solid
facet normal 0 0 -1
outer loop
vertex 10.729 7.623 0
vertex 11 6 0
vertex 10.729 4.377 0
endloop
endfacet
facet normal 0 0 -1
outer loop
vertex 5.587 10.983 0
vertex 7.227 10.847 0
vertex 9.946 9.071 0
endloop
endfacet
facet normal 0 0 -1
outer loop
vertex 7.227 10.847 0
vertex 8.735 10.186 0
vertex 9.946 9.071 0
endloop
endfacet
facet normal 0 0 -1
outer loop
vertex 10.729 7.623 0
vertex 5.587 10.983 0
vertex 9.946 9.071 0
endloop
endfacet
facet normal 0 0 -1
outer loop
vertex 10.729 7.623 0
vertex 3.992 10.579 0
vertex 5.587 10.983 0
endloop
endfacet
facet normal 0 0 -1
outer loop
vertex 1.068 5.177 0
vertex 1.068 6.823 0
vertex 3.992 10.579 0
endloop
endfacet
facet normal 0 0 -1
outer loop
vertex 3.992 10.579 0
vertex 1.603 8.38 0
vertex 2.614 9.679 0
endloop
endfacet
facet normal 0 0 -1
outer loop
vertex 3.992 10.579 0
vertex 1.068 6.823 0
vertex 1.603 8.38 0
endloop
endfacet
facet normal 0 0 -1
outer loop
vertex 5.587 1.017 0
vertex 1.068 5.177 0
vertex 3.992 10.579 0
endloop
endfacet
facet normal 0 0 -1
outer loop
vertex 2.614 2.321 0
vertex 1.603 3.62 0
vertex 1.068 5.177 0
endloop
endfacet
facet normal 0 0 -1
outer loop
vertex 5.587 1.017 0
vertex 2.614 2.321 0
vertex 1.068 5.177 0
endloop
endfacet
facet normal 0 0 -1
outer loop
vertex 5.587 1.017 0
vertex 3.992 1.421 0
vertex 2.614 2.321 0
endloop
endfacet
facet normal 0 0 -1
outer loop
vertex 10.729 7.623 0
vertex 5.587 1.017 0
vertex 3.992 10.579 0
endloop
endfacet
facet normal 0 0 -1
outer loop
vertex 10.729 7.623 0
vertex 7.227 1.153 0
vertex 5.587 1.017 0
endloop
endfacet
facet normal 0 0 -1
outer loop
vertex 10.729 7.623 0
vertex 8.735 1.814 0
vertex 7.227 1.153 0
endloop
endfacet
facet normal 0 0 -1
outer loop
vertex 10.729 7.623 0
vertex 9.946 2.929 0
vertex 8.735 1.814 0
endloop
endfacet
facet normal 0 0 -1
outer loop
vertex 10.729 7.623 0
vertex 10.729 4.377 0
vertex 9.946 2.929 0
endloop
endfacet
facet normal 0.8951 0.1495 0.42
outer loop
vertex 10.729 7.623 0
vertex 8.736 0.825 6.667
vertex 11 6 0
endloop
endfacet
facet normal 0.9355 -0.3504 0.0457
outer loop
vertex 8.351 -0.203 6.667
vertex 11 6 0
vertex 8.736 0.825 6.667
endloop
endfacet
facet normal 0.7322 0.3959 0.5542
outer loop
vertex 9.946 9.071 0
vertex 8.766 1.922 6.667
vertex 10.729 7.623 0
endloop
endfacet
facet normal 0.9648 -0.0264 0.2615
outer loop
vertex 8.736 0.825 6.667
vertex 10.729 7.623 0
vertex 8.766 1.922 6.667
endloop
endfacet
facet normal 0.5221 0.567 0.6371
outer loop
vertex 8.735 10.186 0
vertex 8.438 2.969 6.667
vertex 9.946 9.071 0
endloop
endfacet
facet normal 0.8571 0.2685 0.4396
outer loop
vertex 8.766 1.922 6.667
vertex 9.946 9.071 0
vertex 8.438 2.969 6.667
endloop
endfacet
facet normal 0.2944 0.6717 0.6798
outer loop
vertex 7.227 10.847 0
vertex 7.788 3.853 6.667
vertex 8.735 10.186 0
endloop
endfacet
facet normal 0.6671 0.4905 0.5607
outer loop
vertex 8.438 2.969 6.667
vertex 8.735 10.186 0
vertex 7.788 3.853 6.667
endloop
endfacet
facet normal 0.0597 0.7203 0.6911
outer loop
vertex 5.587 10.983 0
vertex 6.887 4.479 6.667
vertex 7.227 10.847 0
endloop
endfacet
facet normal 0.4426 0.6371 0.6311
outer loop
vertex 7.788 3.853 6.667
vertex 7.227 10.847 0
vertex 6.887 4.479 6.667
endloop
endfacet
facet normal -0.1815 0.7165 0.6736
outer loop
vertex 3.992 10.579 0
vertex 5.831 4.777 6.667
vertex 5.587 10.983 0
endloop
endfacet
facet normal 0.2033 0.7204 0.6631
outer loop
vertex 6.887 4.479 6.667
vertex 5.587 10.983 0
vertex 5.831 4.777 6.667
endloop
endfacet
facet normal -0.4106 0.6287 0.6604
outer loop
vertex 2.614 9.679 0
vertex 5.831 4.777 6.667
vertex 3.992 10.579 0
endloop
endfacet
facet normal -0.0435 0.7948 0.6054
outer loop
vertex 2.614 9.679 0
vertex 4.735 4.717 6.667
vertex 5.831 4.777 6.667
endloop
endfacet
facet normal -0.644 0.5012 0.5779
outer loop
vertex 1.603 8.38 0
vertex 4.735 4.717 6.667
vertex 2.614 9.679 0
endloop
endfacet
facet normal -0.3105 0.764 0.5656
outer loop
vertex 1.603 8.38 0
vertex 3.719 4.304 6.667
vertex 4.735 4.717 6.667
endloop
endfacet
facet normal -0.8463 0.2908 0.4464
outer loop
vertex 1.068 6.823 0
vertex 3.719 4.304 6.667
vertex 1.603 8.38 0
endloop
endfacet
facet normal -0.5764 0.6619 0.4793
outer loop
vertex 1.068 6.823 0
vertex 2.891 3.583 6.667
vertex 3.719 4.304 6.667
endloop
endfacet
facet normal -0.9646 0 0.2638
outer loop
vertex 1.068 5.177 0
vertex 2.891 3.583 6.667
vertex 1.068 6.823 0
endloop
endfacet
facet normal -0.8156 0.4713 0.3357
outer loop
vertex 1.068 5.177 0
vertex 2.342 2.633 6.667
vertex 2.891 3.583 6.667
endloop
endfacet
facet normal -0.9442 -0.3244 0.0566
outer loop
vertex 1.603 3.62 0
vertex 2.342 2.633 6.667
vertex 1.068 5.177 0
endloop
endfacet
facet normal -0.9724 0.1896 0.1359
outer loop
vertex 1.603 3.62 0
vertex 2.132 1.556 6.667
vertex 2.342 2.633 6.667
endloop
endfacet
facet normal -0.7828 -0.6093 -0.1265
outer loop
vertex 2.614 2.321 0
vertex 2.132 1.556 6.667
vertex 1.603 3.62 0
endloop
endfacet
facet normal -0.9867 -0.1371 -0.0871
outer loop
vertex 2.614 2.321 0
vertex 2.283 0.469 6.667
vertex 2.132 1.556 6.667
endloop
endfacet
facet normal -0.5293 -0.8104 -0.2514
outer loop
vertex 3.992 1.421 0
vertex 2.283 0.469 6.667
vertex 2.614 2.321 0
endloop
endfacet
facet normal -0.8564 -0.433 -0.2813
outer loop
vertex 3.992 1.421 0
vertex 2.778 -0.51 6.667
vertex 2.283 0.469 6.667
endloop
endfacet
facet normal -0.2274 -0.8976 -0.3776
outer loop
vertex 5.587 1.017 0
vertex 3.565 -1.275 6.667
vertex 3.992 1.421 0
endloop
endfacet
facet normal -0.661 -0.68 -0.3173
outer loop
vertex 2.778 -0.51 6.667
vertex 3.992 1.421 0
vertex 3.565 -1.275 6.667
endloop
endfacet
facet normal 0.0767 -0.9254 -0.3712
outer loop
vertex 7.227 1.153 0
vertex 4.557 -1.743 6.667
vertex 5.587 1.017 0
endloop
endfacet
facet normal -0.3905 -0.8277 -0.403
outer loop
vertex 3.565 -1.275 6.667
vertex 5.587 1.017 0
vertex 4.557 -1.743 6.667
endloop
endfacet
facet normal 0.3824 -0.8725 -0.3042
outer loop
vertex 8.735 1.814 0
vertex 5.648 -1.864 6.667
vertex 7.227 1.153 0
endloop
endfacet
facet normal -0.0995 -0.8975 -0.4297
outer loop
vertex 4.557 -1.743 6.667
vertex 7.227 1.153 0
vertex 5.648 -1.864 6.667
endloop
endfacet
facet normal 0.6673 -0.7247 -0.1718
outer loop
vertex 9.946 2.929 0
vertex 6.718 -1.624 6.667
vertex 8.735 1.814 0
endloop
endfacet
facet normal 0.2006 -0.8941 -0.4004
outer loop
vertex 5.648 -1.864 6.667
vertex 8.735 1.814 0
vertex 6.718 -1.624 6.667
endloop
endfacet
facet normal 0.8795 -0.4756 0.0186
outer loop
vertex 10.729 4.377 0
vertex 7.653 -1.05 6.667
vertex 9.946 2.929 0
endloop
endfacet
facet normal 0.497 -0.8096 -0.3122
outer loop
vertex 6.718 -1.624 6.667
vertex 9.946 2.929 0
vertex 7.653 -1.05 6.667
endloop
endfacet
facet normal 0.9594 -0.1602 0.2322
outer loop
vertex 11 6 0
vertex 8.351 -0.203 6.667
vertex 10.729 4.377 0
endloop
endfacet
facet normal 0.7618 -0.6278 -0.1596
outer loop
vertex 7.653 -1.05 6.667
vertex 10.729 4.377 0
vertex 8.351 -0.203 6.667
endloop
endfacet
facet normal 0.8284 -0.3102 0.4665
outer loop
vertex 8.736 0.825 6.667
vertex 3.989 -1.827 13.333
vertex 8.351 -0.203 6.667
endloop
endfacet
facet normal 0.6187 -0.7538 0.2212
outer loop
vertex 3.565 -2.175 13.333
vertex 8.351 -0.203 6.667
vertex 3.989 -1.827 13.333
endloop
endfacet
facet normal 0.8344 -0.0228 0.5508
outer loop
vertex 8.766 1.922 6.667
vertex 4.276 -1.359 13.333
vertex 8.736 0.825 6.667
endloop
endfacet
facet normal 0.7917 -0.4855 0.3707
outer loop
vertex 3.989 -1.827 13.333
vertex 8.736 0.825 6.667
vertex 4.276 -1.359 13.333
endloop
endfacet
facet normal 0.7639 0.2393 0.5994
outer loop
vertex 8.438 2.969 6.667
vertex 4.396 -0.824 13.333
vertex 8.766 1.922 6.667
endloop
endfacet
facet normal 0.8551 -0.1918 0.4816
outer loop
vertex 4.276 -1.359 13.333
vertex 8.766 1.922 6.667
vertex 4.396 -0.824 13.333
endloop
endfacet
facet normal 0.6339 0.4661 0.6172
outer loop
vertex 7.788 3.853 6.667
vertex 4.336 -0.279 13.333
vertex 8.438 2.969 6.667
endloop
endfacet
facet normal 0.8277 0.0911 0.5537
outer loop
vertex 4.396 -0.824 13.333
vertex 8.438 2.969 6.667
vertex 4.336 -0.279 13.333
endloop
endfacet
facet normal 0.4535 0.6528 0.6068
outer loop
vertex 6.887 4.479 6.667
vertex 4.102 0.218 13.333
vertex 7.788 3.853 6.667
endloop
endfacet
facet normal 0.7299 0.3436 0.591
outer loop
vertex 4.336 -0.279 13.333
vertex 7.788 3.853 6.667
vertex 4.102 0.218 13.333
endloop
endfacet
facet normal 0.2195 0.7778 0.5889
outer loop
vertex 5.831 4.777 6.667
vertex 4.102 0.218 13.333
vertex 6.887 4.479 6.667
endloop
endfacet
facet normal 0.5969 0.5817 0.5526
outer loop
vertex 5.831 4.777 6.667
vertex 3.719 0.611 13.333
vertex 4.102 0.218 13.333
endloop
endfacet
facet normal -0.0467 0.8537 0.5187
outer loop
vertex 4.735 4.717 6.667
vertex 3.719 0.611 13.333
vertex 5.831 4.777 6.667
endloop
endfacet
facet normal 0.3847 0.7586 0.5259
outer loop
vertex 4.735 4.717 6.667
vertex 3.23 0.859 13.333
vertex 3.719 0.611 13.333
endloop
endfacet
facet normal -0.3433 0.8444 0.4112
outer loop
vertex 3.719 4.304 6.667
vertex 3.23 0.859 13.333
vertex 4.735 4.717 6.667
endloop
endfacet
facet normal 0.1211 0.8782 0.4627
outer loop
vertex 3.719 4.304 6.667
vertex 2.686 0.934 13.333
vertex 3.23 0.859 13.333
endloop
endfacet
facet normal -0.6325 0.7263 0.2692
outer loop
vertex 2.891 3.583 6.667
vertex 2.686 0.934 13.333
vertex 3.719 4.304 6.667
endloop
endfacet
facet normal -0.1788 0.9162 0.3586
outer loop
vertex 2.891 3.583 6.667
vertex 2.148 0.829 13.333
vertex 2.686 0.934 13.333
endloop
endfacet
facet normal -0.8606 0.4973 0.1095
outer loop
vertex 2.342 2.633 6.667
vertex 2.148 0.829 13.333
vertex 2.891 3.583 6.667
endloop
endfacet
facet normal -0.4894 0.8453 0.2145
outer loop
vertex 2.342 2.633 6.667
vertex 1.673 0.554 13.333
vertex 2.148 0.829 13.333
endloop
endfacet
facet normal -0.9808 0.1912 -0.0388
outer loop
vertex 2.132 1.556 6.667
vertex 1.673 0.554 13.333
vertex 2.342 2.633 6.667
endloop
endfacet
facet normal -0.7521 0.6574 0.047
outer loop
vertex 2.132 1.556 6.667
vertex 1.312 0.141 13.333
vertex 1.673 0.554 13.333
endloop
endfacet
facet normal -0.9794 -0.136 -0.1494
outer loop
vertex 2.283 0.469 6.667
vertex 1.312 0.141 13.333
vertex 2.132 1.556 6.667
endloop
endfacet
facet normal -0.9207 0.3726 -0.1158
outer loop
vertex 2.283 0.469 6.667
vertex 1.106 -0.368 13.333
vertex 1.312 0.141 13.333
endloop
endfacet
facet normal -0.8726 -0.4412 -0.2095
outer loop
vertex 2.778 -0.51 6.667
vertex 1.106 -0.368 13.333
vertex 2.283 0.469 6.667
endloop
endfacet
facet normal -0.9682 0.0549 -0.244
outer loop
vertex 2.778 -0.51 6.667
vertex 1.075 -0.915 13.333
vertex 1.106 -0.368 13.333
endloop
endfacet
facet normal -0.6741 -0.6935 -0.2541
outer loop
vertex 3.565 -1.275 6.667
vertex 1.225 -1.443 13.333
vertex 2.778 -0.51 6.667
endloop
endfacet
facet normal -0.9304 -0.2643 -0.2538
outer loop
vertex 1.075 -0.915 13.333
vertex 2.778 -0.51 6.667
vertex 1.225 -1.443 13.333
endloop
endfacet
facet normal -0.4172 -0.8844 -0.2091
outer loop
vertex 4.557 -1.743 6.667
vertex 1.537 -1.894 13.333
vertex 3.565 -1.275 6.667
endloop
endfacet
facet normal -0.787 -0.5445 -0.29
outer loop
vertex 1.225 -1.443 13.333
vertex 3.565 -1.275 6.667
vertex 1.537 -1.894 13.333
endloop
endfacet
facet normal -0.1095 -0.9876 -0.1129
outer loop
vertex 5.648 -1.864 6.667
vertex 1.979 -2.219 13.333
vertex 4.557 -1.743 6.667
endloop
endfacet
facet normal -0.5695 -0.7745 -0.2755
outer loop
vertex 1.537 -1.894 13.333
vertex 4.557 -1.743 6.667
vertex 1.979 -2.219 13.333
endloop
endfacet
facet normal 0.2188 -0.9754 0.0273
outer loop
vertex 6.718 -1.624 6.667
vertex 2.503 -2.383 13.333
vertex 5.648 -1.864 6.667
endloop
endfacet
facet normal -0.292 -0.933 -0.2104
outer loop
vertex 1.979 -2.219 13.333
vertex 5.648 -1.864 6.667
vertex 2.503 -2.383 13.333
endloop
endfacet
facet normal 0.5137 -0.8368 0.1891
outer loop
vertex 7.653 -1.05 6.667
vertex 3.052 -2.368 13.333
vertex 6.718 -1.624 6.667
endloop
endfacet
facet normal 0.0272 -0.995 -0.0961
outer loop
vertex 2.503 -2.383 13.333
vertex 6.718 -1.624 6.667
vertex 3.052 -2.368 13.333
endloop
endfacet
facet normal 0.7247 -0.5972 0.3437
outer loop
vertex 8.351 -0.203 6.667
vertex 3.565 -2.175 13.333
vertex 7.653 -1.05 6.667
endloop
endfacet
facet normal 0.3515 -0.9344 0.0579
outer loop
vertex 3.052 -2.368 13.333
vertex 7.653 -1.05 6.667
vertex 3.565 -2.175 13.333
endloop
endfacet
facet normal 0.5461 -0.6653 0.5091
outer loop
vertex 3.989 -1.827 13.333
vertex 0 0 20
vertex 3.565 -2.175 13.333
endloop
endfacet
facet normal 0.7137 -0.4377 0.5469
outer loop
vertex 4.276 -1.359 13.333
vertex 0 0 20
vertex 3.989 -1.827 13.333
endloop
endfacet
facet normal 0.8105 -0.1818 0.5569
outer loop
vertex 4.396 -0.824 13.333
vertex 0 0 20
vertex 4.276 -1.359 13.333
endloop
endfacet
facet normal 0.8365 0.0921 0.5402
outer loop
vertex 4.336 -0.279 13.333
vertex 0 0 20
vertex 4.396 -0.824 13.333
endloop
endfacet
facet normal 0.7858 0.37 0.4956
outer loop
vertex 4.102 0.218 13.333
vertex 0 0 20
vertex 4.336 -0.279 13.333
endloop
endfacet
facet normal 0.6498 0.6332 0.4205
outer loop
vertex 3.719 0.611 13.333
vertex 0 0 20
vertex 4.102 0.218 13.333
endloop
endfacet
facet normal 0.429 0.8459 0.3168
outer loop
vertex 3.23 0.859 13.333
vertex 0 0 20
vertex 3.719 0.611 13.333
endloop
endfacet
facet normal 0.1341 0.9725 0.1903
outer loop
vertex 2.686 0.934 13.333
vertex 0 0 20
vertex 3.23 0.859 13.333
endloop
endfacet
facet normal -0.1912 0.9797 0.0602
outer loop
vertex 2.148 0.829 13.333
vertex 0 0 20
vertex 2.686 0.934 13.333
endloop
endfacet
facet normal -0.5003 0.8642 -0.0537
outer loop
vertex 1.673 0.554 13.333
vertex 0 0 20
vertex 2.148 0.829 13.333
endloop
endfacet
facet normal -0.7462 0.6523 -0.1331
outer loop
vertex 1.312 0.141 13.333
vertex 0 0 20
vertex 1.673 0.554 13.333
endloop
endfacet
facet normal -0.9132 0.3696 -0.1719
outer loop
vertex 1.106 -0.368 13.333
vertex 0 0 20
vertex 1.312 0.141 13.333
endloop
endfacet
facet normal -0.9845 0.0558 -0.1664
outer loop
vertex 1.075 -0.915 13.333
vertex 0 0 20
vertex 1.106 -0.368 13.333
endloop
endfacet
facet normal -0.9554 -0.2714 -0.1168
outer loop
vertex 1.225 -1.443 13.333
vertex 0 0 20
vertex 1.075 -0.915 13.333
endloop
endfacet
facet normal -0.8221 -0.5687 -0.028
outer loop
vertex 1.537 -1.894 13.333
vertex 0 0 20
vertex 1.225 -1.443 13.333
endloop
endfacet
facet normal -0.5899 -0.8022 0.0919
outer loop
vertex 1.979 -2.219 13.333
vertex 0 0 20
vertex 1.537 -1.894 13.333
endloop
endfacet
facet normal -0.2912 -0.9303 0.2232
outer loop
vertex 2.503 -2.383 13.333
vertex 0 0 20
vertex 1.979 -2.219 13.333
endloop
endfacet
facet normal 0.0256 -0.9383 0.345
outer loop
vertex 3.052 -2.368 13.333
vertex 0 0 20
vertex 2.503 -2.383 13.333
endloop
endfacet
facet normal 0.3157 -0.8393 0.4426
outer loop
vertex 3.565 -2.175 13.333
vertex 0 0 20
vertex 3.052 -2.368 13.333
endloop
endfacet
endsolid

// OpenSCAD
linear_extrude(height=20, twist=90, scale=[-1,-1], slices=3) {
    translate([6,6,0]) {
        circle(5, $fn=19);
    }
}
